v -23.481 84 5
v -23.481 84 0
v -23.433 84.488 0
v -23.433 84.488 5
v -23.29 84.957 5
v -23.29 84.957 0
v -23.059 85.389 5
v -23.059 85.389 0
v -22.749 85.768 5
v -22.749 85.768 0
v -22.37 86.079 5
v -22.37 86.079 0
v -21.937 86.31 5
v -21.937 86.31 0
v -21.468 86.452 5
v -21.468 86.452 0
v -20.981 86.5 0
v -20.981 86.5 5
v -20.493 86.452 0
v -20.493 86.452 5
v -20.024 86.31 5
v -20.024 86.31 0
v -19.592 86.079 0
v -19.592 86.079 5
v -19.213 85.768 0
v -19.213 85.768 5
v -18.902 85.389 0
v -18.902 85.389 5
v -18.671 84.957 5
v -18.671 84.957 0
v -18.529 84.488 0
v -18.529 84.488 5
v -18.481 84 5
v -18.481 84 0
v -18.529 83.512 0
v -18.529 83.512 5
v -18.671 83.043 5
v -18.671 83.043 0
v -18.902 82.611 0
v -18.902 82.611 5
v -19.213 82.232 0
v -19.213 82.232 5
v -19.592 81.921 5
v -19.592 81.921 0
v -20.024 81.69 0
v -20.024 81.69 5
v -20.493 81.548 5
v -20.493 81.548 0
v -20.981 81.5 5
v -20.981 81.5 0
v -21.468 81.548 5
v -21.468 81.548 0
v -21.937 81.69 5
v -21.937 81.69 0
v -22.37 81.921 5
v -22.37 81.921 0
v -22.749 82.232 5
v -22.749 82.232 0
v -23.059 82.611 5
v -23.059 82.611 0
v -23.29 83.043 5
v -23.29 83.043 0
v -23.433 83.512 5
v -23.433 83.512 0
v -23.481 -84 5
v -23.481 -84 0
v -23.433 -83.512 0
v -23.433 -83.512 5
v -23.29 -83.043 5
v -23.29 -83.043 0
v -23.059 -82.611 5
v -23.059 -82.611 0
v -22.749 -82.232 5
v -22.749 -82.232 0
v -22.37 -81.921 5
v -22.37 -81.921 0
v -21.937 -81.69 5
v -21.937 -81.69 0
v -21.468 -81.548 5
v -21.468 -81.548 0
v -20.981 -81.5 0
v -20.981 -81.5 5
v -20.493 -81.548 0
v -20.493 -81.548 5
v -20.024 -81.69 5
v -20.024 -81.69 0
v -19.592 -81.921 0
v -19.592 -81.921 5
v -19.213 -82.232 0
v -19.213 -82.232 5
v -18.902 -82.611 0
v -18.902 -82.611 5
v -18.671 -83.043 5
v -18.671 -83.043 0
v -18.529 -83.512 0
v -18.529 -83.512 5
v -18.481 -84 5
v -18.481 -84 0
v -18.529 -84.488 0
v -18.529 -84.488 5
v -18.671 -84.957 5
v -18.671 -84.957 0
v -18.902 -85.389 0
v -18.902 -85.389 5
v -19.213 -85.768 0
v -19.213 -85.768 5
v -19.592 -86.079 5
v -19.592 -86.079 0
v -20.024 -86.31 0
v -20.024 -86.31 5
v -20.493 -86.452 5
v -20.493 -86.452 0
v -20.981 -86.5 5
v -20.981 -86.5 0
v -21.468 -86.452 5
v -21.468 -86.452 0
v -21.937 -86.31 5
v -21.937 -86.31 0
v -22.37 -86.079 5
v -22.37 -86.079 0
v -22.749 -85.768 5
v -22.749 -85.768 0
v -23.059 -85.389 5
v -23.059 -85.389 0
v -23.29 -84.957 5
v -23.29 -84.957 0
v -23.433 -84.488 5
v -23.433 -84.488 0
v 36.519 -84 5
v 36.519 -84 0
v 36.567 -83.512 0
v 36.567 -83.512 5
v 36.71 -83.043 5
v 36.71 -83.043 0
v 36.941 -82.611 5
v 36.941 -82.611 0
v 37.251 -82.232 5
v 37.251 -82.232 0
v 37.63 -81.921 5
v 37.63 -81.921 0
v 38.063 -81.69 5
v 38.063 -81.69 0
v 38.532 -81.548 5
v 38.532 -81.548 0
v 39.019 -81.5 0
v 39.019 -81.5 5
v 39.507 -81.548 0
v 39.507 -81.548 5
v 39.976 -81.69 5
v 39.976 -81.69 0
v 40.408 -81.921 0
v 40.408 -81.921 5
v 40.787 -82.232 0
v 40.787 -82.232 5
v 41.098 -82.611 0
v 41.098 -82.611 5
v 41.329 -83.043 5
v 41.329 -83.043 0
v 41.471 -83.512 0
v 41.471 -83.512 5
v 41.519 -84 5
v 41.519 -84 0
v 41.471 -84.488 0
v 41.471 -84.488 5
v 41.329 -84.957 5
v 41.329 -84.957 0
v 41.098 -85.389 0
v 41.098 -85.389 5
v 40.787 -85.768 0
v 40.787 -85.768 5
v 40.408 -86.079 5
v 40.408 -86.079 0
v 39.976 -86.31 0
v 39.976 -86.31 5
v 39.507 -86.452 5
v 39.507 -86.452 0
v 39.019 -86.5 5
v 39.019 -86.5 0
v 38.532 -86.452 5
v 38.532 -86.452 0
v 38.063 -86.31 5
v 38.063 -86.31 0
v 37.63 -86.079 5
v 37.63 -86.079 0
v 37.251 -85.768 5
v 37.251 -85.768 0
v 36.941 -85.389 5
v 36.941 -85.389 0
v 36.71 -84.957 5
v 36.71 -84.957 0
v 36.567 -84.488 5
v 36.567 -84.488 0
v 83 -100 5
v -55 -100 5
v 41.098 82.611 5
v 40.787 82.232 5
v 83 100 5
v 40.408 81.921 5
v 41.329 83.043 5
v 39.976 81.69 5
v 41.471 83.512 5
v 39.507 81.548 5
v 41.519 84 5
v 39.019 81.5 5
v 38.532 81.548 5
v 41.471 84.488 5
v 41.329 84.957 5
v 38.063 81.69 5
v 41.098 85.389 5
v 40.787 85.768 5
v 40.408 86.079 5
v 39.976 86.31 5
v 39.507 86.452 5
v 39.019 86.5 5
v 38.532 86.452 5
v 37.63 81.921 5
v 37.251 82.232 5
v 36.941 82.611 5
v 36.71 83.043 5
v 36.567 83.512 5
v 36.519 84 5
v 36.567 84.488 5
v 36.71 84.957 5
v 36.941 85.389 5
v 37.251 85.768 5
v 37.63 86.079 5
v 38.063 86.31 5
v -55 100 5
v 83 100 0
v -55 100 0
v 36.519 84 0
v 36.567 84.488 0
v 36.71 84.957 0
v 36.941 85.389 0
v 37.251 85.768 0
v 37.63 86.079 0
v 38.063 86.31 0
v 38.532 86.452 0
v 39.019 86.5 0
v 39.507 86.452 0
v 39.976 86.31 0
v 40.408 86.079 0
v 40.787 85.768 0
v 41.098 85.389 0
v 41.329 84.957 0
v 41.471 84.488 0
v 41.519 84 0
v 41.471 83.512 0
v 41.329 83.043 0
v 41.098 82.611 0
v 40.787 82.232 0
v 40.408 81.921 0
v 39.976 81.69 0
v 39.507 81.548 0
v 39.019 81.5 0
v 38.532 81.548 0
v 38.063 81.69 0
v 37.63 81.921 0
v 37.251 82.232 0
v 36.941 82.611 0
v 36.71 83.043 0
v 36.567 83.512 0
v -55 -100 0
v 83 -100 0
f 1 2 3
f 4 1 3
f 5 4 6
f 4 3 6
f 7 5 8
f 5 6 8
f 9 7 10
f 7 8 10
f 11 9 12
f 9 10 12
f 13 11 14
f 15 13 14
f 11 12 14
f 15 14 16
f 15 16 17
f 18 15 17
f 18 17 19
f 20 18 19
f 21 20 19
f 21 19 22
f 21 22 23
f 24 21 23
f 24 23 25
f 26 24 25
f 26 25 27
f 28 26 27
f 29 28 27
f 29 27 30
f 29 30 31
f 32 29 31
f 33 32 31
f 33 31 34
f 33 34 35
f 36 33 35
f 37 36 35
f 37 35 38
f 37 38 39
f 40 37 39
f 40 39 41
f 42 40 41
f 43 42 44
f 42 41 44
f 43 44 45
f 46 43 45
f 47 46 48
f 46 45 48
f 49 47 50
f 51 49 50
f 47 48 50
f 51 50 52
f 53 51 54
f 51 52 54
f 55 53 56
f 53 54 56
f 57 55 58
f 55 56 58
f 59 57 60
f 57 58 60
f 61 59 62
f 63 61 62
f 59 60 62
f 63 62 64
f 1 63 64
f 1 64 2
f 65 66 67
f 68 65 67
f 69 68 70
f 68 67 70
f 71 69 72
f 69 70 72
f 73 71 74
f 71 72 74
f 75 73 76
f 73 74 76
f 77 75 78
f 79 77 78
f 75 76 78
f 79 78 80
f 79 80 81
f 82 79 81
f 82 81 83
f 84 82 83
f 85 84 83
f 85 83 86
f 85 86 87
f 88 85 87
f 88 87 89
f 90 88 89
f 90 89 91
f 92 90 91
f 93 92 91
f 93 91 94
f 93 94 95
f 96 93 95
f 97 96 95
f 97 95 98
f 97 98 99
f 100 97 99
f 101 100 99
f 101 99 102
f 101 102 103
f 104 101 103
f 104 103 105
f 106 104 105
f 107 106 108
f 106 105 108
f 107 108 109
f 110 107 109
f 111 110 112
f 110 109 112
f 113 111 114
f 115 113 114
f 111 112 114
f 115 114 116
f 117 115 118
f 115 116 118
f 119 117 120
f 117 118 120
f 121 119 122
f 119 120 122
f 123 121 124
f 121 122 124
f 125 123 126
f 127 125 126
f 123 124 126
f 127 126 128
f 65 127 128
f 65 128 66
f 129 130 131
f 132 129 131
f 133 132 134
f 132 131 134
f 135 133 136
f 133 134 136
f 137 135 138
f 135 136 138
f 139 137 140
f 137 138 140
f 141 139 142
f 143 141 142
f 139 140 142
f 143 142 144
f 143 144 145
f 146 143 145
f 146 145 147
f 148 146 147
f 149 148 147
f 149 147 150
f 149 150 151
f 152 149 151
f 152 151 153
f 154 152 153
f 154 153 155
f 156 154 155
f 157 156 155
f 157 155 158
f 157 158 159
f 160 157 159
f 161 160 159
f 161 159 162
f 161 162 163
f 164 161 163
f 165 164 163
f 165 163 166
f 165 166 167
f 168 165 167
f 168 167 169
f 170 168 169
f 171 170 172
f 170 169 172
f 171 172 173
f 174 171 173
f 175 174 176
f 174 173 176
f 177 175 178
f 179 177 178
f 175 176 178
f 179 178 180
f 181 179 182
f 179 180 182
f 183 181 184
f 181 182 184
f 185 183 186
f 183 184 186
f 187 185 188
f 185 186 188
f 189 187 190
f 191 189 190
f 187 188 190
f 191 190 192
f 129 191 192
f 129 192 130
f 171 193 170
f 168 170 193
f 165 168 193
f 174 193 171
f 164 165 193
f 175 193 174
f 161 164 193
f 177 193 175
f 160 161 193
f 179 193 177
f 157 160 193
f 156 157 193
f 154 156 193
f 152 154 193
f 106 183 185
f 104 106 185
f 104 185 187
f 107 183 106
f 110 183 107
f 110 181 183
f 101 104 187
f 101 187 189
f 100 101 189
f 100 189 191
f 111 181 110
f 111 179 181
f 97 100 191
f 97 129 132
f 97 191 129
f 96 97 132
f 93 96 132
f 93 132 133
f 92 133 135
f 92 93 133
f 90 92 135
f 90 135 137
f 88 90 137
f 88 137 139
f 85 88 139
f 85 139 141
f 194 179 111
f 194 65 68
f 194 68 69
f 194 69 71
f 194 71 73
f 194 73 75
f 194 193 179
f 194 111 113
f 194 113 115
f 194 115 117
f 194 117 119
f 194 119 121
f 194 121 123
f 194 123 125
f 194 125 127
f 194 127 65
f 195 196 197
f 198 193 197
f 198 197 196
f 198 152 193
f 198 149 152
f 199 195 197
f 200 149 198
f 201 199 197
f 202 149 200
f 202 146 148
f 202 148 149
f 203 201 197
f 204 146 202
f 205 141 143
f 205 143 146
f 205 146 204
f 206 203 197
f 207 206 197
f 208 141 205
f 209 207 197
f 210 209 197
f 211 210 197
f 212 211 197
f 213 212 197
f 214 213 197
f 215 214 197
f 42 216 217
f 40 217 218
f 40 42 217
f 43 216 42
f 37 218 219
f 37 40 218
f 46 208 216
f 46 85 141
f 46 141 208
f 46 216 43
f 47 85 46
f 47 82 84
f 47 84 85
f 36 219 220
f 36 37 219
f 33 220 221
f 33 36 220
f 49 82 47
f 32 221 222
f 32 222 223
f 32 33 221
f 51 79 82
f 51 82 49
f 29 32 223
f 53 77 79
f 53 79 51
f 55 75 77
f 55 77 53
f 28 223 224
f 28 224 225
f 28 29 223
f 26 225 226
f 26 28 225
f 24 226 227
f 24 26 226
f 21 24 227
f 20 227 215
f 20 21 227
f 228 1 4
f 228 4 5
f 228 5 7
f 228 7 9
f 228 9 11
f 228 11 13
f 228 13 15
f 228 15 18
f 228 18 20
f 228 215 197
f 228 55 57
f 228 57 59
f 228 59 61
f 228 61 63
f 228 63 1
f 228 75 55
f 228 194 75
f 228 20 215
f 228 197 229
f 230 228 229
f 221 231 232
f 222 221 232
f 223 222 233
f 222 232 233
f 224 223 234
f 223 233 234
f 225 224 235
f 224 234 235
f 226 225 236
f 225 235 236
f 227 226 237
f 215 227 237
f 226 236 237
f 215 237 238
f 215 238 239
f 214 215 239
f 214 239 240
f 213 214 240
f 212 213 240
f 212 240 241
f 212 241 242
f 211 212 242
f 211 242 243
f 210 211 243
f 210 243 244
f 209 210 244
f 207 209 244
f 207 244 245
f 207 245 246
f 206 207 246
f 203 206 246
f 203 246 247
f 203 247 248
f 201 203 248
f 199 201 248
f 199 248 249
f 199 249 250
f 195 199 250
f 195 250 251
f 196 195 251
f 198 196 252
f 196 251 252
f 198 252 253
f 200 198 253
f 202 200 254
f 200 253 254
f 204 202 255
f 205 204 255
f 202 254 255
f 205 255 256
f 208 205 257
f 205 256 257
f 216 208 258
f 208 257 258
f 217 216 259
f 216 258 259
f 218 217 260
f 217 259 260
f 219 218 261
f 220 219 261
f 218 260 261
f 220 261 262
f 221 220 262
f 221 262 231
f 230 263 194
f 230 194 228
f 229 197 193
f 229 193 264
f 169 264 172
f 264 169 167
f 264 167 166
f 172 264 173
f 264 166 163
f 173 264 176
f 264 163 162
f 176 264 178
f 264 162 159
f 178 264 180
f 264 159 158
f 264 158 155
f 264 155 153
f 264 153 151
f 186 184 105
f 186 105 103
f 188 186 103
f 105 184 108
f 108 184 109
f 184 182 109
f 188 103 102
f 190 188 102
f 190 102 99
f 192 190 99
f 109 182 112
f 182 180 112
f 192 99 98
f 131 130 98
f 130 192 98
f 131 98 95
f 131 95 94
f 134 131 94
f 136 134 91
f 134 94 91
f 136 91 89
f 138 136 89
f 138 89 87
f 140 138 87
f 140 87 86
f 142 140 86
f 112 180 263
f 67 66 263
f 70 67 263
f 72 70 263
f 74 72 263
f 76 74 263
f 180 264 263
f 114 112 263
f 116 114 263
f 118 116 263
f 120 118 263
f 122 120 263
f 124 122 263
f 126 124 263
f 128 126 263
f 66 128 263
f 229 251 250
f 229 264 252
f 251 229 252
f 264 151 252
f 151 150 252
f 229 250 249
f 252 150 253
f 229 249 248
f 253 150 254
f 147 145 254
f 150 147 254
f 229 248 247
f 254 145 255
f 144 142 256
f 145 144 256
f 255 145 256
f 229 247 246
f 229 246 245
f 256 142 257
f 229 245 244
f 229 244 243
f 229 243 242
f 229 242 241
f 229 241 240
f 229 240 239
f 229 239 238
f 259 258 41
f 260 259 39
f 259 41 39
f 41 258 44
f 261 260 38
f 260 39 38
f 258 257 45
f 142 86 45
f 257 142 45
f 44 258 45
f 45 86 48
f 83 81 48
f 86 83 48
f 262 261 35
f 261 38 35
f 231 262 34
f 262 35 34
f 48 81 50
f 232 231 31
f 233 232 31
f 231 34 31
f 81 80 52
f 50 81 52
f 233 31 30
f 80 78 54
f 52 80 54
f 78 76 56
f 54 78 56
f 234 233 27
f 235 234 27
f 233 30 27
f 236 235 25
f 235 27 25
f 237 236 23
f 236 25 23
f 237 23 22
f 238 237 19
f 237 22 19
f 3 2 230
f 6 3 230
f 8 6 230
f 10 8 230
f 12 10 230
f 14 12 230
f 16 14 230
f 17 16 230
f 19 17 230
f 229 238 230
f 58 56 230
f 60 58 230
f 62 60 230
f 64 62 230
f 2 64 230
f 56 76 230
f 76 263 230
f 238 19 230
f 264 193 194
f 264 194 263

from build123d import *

# Parameters (mm, degrees)
ESQUISSE1_W             = 110
ESQUISSE1_H             = 200
BOSS_EXTRU_1_DEPTH      = 5
ESQUISSE28_R            = 2.5
ENL_V_MAT_EXTRU_1_DEPTH = 115.236596588
ESQUISSE29_W            = 5
ESQUISSE29_H            = 200
BOSS_EXTRU_2_DEPTH      = 28


with BuildPart() as part:
    # Esquisse1 → Boss.-Extru.1 (new body)
    with BuildSketch(Plane.XY):
        Rectangle(ESQUISSE1_W, ESQUISSE1_H)
    extrude(amount=BOSS_EXTRU_1_DEPTH)

    # Esquisse28 → Enlèv. mat.-Extru.1 (cut, through all)
    with BuildSketch(Plane(origin=(0, 0, 0), x_dir=(-1, 0, 0), z_dir=(0, 0, -1))):
        with Locations((20.980762114, -84)):
            Circle(ESQUISSE28_R)
        with Locations((-39.019237886, -84)):
            Circle(ESQUISSE28_R)
        with Locations((20.980762114, 84)):
            Circle(ESQUISSE28_R)
        with Locations((-39.019237886, 84)):
            Circle(ESQUISSE28_R)
    extrude(amount=-ENL_V_MAT_EXTRU_1_DEPTH, mode=Mode.SUBTRACT)

    # Esquisse29 → Boss.-Extru.2 (add)
    with BuildSketch(Plane(origin=(55, 0, 0), x_dir=(0, 0, -1), z_dir=(1, 0, 0))):
        with Locations((-2.5, 0)):
            Rectangle(ESQUISSE29_W, ESQUISSE29_H)
    extrude(amount=BOSS_EXTRU_2_DEPTH)


solid = part.part
